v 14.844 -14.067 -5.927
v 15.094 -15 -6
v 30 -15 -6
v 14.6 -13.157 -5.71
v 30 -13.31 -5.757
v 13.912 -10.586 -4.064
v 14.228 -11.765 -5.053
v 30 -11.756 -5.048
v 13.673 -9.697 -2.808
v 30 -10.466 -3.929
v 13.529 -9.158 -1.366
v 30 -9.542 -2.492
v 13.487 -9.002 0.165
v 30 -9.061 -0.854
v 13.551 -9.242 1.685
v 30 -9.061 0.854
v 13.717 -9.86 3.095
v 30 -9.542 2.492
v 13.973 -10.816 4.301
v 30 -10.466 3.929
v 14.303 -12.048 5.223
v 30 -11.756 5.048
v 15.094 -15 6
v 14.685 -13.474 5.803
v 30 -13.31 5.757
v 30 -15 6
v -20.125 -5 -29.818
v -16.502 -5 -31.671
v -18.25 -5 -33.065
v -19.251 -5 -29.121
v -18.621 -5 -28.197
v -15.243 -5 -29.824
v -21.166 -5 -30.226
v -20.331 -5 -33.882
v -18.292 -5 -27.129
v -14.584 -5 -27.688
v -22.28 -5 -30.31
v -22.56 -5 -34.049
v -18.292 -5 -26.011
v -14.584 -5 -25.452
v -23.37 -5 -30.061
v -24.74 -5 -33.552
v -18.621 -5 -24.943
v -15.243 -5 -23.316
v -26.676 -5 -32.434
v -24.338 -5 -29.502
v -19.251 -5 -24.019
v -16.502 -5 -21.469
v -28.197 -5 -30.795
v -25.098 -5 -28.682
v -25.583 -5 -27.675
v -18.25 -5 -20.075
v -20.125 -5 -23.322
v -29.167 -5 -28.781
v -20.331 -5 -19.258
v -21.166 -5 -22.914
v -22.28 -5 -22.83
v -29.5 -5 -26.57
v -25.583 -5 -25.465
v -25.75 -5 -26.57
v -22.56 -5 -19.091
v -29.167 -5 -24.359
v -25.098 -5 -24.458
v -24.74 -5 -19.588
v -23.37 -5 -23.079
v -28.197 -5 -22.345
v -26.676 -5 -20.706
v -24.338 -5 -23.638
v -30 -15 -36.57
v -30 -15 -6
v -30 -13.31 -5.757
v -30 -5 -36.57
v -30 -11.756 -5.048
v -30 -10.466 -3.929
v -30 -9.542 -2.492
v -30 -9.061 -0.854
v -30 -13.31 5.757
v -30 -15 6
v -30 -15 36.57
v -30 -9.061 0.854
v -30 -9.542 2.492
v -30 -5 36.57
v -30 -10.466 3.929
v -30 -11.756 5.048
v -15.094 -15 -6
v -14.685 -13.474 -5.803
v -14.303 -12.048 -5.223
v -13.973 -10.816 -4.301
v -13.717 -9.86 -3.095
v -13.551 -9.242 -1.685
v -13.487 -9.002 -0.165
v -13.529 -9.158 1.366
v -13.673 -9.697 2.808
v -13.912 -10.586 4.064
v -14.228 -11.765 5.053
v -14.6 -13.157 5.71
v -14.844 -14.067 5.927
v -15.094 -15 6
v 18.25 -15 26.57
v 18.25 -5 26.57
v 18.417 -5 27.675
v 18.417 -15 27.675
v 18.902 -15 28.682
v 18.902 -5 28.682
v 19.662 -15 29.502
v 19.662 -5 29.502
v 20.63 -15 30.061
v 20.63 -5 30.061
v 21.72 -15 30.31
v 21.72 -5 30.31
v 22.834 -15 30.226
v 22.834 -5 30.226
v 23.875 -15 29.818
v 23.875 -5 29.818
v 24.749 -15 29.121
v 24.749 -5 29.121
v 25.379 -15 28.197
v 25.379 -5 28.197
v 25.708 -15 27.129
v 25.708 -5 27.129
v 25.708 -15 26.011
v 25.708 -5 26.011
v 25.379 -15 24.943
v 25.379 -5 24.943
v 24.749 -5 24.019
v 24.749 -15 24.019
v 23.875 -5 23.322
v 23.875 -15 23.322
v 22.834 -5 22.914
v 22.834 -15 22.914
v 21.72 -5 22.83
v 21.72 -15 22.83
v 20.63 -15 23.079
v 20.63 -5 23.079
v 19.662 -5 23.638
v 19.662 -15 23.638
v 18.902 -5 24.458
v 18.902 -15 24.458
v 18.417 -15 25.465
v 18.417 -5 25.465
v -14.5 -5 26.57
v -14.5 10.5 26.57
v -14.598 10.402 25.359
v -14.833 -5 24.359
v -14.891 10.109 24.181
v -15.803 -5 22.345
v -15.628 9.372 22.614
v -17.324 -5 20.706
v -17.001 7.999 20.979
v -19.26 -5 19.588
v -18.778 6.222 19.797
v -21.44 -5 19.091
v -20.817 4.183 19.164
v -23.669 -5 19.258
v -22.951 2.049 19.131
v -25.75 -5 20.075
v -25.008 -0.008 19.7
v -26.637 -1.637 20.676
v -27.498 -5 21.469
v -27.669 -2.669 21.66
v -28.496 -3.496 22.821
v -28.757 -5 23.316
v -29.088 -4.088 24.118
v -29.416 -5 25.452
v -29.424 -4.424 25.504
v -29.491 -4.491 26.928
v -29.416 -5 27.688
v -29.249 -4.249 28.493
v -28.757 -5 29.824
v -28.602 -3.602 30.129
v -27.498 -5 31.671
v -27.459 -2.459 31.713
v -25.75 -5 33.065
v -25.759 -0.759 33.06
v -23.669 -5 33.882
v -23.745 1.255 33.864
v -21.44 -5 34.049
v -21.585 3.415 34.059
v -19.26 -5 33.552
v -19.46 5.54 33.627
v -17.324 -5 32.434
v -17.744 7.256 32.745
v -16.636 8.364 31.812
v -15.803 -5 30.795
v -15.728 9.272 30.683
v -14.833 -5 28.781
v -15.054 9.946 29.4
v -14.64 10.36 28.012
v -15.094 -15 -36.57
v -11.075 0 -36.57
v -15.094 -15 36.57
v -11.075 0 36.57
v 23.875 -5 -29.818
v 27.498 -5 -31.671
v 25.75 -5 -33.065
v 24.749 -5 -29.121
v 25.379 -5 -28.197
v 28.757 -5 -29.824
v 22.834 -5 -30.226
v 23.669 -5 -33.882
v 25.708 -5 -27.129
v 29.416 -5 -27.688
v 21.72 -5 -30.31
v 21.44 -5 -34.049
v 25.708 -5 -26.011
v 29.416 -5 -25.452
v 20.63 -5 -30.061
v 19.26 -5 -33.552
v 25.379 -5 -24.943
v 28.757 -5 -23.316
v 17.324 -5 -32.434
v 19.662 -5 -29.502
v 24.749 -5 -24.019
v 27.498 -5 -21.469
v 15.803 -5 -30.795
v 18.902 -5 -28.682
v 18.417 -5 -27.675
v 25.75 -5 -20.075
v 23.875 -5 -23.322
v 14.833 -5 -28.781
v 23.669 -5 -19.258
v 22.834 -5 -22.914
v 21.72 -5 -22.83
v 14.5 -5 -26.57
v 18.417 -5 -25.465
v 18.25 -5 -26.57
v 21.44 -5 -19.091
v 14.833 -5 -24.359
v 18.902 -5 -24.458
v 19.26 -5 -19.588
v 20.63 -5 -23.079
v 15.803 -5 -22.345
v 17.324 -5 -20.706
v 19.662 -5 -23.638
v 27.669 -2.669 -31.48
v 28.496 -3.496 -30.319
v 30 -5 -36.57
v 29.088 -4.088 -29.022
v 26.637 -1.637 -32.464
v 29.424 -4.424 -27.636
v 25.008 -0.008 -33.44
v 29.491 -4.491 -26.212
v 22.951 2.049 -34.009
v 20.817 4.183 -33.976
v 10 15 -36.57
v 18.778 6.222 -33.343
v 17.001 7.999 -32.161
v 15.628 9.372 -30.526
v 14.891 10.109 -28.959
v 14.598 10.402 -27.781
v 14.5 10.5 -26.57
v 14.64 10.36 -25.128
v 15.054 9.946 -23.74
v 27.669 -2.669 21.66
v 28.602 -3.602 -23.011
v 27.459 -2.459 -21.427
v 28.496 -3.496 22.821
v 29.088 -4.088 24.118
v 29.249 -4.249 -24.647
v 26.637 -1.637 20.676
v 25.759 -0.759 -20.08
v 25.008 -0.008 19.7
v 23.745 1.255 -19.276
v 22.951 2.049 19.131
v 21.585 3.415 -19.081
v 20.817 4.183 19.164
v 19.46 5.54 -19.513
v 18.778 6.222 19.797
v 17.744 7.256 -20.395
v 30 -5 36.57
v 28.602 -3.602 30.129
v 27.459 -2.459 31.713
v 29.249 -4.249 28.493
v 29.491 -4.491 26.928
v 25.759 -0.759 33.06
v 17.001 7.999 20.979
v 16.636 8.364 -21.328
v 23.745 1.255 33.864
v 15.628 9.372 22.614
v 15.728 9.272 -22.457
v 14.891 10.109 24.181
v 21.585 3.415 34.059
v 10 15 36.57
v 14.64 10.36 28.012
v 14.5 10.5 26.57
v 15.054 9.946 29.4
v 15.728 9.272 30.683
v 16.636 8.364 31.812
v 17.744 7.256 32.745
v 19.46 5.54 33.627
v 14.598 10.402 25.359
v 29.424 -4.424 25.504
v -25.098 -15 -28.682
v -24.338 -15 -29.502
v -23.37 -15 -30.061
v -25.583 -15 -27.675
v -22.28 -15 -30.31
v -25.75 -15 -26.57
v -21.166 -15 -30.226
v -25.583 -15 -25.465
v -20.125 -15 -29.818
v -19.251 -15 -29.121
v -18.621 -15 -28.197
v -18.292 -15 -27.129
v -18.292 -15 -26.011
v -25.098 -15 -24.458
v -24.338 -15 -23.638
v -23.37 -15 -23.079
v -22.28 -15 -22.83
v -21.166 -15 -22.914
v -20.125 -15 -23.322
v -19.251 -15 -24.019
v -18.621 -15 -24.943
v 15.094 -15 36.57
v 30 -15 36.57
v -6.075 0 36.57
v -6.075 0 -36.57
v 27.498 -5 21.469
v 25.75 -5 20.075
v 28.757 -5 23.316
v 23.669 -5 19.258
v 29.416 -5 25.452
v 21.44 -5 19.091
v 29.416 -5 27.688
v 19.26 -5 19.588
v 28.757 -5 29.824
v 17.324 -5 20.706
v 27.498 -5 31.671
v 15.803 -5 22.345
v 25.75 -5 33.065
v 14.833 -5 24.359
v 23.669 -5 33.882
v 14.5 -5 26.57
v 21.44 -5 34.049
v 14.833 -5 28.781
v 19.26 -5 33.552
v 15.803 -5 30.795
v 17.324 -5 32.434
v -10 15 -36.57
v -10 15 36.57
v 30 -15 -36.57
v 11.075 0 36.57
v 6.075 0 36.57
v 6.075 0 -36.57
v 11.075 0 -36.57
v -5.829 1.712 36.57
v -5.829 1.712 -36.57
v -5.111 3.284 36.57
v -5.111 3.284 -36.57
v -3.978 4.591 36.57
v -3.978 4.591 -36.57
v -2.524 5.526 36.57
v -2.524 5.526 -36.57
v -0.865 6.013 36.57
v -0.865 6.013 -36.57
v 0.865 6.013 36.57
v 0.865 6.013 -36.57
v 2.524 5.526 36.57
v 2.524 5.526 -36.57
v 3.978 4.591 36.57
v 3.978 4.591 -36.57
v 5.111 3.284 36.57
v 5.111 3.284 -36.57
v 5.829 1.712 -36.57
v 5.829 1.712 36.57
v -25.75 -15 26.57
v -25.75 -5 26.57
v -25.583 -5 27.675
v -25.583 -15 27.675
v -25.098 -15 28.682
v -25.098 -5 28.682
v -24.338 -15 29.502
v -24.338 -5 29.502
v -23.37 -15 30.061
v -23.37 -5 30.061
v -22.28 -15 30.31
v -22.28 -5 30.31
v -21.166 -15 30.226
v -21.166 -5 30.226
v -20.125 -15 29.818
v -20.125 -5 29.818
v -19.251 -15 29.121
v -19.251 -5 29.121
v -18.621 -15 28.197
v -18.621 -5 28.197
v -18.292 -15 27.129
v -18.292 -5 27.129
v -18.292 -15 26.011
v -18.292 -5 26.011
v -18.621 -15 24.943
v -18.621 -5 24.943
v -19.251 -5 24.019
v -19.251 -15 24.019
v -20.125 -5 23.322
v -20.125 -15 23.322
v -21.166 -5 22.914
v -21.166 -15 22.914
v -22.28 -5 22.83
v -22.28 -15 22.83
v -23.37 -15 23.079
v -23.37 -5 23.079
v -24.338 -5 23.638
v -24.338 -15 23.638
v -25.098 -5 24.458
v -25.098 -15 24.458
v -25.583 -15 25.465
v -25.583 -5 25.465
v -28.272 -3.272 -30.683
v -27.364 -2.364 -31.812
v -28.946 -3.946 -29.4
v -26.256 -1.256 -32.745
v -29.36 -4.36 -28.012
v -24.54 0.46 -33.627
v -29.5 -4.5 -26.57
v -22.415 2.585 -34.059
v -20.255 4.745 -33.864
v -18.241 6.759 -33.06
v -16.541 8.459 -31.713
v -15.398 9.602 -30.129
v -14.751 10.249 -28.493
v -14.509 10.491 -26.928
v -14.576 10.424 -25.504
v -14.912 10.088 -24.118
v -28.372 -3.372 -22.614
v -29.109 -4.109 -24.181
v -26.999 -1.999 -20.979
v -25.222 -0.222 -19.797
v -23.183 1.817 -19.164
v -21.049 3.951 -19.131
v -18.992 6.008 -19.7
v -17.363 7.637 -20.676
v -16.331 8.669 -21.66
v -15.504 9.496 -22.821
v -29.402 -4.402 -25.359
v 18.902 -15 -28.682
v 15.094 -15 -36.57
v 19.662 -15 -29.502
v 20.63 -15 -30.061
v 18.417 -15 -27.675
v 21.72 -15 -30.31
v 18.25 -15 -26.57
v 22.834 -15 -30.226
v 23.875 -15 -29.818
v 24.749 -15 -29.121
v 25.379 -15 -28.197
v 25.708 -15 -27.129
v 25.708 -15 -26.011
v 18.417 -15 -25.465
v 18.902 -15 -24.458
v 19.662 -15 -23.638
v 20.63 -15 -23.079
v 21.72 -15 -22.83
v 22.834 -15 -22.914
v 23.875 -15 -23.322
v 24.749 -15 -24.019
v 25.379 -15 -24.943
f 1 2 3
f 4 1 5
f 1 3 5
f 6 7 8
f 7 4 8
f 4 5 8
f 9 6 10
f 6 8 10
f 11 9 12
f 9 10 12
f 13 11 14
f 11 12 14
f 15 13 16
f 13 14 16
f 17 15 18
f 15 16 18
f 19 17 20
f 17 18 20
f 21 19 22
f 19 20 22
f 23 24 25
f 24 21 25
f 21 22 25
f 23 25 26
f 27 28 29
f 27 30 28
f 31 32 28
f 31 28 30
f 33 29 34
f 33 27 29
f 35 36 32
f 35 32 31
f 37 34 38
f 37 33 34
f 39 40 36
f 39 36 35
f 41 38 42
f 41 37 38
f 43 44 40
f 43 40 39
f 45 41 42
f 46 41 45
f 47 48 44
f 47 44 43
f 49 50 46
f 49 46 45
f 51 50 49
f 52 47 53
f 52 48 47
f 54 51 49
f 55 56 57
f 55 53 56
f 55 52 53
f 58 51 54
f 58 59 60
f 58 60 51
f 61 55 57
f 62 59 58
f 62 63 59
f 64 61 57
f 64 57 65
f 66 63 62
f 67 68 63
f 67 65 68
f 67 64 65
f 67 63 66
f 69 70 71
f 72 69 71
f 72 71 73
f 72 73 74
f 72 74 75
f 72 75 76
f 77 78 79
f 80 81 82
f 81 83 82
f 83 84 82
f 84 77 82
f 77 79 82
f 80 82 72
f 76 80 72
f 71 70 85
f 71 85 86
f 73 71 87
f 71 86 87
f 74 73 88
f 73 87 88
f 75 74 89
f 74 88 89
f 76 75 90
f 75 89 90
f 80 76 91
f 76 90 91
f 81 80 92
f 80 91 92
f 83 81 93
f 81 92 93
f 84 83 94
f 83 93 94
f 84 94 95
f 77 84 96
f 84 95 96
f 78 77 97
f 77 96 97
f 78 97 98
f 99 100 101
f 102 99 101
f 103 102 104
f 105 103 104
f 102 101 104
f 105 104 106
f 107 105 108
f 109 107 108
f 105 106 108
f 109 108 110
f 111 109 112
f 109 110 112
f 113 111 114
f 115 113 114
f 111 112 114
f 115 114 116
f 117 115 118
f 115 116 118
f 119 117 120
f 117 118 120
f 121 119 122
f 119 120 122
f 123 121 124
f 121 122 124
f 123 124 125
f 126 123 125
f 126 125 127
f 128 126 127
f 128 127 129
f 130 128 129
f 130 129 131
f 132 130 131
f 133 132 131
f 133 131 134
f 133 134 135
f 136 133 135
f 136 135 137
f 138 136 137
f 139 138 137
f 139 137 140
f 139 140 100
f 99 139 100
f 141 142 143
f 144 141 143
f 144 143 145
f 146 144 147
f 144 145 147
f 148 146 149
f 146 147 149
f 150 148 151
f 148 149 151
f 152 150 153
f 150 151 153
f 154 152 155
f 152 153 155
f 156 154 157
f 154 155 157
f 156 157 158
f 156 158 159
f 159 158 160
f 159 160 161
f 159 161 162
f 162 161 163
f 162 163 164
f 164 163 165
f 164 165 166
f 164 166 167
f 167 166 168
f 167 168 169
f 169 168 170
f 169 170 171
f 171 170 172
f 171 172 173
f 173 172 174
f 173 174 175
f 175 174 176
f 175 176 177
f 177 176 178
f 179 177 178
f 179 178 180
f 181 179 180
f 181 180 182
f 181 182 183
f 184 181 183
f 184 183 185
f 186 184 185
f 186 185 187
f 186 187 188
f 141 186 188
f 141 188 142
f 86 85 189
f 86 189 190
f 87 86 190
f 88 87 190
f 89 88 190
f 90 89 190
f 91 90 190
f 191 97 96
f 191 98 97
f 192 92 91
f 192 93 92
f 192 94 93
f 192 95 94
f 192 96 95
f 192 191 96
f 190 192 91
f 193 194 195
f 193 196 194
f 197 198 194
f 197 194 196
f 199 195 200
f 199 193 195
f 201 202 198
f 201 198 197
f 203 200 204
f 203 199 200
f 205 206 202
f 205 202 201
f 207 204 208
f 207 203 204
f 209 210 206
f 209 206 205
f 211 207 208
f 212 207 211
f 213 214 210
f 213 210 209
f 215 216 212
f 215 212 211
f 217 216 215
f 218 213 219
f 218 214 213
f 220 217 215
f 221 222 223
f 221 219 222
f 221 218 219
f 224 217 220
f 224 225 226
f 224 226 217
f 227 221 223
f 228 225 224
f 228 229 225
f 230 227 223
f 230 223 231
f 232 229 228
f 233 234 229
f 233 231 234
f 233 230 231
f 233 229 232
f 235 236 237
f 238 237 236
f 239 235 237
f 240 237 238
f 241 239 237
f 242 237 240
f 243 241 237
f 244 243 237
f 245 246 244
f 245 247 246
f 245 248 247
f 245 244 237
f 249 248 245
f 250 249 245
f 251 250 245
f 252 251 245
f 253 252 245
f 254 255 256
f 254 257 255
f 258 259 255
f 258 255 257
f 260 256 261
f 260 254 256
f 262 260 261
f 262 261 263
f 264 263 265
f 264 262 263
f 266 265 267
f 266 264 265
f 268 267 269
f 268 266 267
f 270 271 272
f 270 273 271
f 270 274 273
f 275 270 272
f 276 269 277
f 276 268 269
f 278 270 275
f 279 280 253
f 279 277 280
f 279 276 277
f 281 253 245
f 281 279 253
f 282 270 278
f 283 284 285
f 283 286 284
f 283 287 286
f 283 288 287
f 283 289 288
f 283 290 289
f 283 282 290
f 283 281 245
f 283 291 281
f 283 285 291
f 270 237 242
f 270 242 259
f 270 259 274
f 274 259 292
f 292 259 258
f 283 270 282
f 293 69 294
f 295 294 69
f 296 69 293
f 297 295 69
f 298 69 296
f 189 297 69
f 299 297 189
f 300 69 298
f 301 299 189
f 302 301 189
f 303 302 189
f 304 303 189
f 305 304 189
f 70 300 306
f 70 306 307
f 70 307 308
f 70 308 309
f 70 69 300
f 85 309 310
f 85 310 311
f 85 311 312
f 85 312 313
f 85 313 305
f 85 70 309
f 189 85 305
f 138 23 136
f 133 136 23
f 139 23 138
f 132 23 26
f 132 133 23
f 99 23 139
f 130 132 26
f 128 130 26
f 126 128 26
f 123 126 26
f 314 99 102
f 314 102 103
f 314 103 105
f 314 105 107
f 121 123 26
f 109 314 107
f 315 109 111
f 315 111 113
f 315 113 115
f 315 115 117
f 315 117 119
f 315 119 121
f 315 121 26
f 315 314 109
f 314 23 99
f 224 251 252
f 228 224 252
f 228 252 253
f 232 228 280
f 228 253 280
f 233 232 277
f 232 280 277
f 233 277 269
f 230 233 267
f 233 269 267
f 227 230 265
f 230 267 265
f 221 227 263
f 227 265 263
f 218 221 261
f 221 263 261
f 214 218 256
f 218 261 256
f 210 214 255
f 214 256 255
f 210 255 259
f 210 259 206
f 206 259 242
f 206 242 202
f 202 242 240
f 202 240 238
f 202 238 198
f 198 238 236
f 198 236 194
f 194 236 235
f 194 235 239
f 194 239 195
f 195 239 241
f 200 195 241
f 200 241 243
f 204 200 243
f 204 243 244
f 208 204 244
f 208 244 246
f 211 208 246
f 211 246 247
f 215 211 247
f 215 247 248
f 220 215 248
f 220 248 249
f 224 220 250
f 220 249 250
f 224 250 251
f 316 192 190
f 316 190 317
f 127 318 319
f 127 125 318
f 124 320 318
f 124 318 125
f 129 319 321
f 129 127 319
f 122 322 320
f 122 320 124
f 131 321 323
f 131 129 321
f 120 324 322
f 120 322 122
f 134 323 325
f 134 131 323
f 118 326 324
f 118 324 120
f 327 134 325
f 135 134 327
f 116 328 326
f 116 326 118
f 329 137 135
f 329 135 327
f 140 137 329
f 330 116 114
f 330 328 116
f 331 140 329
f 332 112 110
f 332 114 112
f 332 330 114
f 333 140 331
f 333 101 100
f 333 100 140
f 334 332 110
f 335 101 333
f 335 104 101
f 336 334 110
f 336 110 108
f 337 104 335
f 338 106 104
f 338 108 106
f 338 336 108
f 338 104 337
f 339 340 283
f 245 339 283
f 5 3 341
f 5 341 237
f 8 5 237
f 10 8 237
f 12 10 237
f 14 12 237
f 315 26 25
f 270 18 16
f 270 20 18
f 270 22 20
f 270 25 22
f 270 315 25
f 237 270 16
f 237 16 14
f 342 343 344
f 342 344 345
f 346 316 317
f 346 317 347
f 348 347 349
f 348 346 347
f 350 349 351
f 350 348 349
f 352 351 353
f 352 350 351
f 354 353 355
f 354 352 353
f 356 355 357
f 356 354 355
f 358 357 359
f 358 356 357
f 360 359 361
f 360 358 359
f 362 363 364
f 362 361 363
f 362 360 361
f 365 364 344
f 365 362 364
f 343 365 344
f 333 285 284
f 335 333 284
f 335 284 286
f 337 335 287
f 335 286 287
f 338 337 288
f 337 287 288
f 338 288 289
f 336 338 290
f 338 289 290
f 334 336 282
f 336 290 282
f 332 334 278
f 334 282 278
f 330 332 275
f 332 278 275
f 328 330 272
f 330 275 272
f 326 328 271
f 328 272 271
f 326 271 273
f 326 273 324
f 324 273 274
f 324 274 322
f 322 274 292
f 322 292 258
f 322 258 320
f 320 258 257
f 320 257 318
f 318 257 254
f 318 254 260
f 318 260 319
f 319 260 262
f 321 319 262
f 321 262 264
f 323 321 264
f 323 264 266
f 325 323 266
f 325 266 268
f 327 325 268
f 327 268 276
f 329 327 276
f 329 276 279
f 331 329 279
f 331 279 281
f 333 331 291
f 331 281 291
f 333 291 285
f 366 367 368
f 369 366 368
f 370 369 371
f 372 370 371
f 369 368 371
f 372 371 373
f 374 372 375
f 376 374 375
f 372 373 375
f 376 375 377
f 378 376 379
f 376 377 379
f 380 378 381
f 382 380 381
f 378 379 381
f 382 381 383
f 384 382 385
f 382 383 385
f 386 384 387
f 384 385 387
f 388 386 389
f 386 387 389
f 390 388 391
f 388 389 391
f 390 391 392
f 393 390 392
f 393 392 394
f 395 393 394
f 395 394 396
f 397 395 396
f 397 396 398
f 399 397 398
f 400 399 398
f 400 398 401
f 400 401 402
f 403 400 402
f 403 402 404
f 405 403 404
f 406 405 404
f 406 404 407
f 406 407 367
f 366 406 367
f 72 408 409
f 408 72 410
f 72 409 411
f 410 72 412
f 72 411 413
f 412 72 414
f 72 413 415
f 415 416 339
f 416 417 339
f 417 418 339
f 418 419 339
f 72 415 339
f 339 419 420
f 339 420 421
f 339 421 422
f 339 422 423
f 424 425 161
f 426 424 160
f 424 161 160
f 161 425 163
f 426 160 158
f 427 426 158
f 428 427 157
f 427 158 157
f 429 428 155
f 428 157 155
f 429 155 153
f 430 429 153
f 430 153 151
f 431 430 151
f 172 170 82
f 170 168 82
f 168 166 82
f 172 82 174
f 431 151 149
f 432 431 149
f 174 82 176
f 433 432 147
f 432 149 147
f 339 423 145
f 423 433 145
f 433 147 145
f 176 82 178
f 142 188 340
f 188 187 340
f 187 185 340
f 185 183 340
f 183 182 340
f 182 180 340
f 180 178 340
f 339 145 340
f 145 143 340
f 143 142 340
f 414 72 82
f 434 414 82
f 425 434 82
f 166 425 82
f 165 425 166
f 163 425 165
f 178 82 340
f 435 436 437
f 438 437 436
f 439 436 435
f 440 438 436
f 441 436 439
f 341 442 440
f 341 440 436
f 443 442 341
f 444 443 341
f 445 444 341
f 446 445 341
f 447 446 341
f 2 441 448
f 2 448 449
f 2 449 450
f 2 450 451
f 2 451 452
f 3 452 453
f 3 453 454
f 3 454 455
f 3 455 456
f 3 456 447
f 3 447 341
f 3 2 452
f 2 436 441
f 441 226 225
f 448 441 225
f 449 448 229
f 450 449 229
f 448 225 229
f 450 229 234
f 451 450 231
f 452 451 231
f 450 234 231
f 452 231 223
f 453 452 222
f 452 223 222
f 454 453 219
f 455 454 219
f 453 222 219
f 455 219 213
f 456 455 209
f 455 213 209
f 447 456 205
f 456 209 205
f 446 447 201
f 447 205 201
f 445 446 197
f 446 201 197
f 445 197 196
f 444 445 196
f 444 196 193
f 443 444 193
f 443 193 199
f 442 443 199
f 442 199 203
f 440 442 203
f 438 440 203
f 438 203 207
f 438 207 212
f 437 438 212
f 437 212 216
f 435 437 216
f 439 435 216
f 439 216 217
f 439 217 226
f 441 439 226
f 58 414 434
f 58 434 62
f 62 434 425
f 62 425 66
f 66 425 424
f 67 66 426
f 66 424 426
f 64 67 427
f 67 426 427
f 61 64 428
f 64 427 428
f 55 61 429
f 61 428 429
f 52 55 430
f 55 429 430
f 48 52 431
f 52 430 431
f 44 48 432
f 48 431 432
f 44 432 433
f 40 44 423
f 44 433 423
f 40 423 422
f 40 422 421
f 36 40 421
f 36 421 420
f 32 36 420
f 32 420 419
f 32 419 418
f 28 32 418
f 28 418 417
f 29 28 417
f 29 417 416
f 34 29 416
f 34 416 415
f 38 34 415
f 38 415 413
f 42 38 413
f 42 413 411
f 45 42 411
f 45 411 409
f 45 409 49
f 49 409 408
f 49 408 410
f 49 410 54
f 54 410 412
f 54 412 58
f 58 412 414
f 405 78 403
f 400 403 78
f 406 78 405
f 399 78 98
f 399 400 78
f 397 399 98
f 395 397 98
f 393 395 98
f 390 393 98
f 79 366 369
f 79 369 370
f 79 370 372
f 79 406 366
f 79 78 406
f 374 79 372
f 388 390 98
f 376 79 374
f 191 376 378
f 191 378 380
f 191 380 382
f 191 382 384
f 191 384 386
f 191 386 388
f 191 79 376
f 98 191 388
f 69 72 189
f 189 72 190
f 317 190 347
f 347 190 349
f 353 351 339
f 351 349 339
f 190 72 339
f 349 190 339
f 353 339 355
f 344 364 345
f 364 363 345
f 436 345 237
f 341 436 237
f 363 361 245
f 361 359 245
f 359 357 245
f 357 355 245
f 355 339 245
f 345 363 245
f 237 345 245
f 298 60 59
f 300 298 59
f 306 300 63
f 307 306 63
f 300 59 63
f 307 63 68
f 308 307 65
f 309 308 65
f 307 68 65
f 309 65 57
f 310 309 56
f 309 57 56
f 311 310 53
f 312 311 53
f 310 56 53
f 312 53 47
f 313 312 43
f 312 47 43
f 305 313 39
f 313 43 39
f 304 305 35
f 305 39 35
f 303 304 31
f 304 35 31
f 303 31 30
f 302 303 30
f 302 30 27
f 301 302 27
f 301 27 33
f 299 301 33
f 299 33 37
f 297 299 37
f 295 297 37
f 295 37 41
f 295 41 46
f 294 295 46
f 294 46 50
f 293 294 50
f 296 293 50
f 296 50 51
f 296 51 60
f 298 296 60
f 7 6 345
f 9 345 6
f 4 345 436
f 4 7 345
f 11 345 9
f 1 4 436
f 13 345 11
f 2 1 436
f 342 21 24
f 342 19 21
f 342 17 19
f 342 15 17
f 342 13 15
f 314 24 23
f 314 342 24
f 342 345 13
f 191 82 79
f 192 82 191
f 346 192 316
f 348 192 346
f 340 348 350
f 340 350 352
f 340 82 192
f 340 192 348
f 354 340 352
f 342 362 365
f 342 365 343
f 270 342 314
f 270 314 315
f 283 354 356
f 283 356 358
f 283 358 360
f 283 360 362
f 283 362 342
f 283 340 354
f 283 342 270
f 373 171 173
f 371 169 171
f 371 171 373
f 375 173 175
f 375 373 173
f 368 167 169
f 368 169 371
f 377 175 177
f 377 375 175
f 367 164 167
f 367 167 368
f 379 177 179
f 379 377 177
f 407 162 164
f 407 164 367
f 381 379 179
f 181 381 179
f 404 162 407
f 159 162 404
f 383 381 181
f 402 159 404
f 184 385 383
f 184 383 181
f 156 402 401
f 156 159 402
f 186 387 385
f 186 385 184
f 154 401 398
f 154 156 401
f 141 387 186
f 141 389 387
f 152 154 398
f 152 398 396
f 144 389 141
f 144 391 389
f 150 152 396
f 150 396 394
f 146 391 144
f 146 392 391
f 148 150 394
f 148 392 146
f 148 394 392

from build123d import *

# Parameters (mm, degrees)
SKETCH1_W           = 60
SKETCH1_H           = 30
BOSS_EXTRUDE1_DEPTH = 36.57
CUT_EXTRUDE1_DEPTH  = 60
CUT_EXTRUDE2_REACH  = 82.464
CUT_EXTRUDE3_DEPTH  = 73.14
SKETCH5_R           = 3.75
CUT_EXTRUDE4_DEPTH  = 30
SKETCH6_R           = 7.5
CUT_EXTRUDE5_DEPTH  = 20


with BuildPart() as part:
    # Sketch1 → Boss-Extrude1 (new, symmetric)
    with BuildSketch(Plane.XY):
        Rectangle(SKETCH1_W, SKETCH1_H)
    extrude(amount=BOSS_EXTRUDE1_DEPTH, both=True)

    # Sketch2 → Cut-Extrude1 (cut)
    with BuildSketch(Plane(origin=(30, 0, 0), x_dir=(0, 0, -1), z_dir=(1, 0, 0))):
        with BuildLine():
            ThreePointArc((6, -15), (0, -9), (-6, -15))
            Line((-6, -15), (6, -15))
        make_face()
    extrude(amount=-CUT_EXTRUDE1_DEPTH, mode=Mode.SUBTRACT)

    # Cut-Extrude2: up to this face of the body (flat: up to its plane)
    cut_extrude2_end = Plane(part.part.faces().sort_by_distance((0, 0, -36.57))[0])
    # Sketch3 → Cut-Extrude2 (cut, up to the picked face)
    with BuildSketch(Plane.XY.offset(36.57), mode=Mode.PRIVATE) as cut_extrude2_sk1:
        with BuildLine():
            Line((6.075, 0), (11.075, 0))
            Line((11.075, 0), (15.094237886, -15))
            Line((15.094237886, -15), (-15.094237886, -15))
            Line((-15.094237886, -15), (-11.075, 0))
            Line((-11.075, 0), (-6.075, 0))
            ThreePointArc((-6.075, 0), (0, 6.075), (6.075, 0))
        make_face()
    cut_extrude2_tool1 = split(extrude(cut_extrude2_sk1.sketch, amount=-CUT_EXTRUDE2_REACH, mode=Mode.PRIVATE), bisect_by=cut_extrude2_end, keep=Keep.BOTH, mode=Mode.PRIVATE)
    add(cut_extrude2_tool1.solids().sort_by(Axis((0, -6.537689, 36.57), (0, 0, -1)))[0], mode=Mode.SUBTRACT)

    # Sketch4 → Cut-Extrude3 (cut)
    with BuildSketch(Plane.XY.offset(36.57)):
        Polygon((30, 15), (30, -5), (10, 15), align=None)
        Polygon((-30, 15), (-30, -5), (-10, 15), align=None)
    extrude(amount=-CUT_EXTRUDE3_DEPTH, mode=Mode.SUBTRACT)

    # Sketch5 → Cut-Extrude4 (cut)
    with BuildSketch(Plane(origin=(0, 15, 0), x_dir=(1, 0, 0), z_dir=(0, 1, 0))):
        with Locations(Location((22, -26.57, 0), (0, 0, 180))):
            Circle(SKETCH5_R)
        with Locations(Location((-22, -26.57, 0), (0, 0, 180))):
            Circle(SKETCH5_R)
        with Locations(Location((22, 26.57, 0), (0, 0, 180))):
            Circle(SKETCH5_R)
        with Locations(Location((-22, 26.57, 0), (0, 0, 180))):
            Circle(SKETCH5_R)
    extrude(amount=-CUT_EXTRUDE4_DEPTH, mode=Mode.SUBTRACT)

    # Sketch6 → Cut-Extrude5 (cut)
    with BuildSketch(Plane(origin=(0, 15, 0), x_dir=(1, 0, 0), z_dir=(0, 1, 0))):
        with Locations(Location((22, -26.57, 0), (0, 0, 180))):
            Circle(SKETCH6_R)
        with Locations((-22, -26.57)):
            Circle(SKETCH6_R)
        with Locations(Location((22, 26.57, 0), (0, 0, 180))):
            Circle(SKETCH6_R)
        with Locations(Location((-22, 26.57, 0), (0, 0, 180))):
            Circle(SKETCH6_R)
    extrude(amount=-CUT_EXTRUDE5_DEPTH, mode=Mode.SUBTRACT)


solid = part.part
